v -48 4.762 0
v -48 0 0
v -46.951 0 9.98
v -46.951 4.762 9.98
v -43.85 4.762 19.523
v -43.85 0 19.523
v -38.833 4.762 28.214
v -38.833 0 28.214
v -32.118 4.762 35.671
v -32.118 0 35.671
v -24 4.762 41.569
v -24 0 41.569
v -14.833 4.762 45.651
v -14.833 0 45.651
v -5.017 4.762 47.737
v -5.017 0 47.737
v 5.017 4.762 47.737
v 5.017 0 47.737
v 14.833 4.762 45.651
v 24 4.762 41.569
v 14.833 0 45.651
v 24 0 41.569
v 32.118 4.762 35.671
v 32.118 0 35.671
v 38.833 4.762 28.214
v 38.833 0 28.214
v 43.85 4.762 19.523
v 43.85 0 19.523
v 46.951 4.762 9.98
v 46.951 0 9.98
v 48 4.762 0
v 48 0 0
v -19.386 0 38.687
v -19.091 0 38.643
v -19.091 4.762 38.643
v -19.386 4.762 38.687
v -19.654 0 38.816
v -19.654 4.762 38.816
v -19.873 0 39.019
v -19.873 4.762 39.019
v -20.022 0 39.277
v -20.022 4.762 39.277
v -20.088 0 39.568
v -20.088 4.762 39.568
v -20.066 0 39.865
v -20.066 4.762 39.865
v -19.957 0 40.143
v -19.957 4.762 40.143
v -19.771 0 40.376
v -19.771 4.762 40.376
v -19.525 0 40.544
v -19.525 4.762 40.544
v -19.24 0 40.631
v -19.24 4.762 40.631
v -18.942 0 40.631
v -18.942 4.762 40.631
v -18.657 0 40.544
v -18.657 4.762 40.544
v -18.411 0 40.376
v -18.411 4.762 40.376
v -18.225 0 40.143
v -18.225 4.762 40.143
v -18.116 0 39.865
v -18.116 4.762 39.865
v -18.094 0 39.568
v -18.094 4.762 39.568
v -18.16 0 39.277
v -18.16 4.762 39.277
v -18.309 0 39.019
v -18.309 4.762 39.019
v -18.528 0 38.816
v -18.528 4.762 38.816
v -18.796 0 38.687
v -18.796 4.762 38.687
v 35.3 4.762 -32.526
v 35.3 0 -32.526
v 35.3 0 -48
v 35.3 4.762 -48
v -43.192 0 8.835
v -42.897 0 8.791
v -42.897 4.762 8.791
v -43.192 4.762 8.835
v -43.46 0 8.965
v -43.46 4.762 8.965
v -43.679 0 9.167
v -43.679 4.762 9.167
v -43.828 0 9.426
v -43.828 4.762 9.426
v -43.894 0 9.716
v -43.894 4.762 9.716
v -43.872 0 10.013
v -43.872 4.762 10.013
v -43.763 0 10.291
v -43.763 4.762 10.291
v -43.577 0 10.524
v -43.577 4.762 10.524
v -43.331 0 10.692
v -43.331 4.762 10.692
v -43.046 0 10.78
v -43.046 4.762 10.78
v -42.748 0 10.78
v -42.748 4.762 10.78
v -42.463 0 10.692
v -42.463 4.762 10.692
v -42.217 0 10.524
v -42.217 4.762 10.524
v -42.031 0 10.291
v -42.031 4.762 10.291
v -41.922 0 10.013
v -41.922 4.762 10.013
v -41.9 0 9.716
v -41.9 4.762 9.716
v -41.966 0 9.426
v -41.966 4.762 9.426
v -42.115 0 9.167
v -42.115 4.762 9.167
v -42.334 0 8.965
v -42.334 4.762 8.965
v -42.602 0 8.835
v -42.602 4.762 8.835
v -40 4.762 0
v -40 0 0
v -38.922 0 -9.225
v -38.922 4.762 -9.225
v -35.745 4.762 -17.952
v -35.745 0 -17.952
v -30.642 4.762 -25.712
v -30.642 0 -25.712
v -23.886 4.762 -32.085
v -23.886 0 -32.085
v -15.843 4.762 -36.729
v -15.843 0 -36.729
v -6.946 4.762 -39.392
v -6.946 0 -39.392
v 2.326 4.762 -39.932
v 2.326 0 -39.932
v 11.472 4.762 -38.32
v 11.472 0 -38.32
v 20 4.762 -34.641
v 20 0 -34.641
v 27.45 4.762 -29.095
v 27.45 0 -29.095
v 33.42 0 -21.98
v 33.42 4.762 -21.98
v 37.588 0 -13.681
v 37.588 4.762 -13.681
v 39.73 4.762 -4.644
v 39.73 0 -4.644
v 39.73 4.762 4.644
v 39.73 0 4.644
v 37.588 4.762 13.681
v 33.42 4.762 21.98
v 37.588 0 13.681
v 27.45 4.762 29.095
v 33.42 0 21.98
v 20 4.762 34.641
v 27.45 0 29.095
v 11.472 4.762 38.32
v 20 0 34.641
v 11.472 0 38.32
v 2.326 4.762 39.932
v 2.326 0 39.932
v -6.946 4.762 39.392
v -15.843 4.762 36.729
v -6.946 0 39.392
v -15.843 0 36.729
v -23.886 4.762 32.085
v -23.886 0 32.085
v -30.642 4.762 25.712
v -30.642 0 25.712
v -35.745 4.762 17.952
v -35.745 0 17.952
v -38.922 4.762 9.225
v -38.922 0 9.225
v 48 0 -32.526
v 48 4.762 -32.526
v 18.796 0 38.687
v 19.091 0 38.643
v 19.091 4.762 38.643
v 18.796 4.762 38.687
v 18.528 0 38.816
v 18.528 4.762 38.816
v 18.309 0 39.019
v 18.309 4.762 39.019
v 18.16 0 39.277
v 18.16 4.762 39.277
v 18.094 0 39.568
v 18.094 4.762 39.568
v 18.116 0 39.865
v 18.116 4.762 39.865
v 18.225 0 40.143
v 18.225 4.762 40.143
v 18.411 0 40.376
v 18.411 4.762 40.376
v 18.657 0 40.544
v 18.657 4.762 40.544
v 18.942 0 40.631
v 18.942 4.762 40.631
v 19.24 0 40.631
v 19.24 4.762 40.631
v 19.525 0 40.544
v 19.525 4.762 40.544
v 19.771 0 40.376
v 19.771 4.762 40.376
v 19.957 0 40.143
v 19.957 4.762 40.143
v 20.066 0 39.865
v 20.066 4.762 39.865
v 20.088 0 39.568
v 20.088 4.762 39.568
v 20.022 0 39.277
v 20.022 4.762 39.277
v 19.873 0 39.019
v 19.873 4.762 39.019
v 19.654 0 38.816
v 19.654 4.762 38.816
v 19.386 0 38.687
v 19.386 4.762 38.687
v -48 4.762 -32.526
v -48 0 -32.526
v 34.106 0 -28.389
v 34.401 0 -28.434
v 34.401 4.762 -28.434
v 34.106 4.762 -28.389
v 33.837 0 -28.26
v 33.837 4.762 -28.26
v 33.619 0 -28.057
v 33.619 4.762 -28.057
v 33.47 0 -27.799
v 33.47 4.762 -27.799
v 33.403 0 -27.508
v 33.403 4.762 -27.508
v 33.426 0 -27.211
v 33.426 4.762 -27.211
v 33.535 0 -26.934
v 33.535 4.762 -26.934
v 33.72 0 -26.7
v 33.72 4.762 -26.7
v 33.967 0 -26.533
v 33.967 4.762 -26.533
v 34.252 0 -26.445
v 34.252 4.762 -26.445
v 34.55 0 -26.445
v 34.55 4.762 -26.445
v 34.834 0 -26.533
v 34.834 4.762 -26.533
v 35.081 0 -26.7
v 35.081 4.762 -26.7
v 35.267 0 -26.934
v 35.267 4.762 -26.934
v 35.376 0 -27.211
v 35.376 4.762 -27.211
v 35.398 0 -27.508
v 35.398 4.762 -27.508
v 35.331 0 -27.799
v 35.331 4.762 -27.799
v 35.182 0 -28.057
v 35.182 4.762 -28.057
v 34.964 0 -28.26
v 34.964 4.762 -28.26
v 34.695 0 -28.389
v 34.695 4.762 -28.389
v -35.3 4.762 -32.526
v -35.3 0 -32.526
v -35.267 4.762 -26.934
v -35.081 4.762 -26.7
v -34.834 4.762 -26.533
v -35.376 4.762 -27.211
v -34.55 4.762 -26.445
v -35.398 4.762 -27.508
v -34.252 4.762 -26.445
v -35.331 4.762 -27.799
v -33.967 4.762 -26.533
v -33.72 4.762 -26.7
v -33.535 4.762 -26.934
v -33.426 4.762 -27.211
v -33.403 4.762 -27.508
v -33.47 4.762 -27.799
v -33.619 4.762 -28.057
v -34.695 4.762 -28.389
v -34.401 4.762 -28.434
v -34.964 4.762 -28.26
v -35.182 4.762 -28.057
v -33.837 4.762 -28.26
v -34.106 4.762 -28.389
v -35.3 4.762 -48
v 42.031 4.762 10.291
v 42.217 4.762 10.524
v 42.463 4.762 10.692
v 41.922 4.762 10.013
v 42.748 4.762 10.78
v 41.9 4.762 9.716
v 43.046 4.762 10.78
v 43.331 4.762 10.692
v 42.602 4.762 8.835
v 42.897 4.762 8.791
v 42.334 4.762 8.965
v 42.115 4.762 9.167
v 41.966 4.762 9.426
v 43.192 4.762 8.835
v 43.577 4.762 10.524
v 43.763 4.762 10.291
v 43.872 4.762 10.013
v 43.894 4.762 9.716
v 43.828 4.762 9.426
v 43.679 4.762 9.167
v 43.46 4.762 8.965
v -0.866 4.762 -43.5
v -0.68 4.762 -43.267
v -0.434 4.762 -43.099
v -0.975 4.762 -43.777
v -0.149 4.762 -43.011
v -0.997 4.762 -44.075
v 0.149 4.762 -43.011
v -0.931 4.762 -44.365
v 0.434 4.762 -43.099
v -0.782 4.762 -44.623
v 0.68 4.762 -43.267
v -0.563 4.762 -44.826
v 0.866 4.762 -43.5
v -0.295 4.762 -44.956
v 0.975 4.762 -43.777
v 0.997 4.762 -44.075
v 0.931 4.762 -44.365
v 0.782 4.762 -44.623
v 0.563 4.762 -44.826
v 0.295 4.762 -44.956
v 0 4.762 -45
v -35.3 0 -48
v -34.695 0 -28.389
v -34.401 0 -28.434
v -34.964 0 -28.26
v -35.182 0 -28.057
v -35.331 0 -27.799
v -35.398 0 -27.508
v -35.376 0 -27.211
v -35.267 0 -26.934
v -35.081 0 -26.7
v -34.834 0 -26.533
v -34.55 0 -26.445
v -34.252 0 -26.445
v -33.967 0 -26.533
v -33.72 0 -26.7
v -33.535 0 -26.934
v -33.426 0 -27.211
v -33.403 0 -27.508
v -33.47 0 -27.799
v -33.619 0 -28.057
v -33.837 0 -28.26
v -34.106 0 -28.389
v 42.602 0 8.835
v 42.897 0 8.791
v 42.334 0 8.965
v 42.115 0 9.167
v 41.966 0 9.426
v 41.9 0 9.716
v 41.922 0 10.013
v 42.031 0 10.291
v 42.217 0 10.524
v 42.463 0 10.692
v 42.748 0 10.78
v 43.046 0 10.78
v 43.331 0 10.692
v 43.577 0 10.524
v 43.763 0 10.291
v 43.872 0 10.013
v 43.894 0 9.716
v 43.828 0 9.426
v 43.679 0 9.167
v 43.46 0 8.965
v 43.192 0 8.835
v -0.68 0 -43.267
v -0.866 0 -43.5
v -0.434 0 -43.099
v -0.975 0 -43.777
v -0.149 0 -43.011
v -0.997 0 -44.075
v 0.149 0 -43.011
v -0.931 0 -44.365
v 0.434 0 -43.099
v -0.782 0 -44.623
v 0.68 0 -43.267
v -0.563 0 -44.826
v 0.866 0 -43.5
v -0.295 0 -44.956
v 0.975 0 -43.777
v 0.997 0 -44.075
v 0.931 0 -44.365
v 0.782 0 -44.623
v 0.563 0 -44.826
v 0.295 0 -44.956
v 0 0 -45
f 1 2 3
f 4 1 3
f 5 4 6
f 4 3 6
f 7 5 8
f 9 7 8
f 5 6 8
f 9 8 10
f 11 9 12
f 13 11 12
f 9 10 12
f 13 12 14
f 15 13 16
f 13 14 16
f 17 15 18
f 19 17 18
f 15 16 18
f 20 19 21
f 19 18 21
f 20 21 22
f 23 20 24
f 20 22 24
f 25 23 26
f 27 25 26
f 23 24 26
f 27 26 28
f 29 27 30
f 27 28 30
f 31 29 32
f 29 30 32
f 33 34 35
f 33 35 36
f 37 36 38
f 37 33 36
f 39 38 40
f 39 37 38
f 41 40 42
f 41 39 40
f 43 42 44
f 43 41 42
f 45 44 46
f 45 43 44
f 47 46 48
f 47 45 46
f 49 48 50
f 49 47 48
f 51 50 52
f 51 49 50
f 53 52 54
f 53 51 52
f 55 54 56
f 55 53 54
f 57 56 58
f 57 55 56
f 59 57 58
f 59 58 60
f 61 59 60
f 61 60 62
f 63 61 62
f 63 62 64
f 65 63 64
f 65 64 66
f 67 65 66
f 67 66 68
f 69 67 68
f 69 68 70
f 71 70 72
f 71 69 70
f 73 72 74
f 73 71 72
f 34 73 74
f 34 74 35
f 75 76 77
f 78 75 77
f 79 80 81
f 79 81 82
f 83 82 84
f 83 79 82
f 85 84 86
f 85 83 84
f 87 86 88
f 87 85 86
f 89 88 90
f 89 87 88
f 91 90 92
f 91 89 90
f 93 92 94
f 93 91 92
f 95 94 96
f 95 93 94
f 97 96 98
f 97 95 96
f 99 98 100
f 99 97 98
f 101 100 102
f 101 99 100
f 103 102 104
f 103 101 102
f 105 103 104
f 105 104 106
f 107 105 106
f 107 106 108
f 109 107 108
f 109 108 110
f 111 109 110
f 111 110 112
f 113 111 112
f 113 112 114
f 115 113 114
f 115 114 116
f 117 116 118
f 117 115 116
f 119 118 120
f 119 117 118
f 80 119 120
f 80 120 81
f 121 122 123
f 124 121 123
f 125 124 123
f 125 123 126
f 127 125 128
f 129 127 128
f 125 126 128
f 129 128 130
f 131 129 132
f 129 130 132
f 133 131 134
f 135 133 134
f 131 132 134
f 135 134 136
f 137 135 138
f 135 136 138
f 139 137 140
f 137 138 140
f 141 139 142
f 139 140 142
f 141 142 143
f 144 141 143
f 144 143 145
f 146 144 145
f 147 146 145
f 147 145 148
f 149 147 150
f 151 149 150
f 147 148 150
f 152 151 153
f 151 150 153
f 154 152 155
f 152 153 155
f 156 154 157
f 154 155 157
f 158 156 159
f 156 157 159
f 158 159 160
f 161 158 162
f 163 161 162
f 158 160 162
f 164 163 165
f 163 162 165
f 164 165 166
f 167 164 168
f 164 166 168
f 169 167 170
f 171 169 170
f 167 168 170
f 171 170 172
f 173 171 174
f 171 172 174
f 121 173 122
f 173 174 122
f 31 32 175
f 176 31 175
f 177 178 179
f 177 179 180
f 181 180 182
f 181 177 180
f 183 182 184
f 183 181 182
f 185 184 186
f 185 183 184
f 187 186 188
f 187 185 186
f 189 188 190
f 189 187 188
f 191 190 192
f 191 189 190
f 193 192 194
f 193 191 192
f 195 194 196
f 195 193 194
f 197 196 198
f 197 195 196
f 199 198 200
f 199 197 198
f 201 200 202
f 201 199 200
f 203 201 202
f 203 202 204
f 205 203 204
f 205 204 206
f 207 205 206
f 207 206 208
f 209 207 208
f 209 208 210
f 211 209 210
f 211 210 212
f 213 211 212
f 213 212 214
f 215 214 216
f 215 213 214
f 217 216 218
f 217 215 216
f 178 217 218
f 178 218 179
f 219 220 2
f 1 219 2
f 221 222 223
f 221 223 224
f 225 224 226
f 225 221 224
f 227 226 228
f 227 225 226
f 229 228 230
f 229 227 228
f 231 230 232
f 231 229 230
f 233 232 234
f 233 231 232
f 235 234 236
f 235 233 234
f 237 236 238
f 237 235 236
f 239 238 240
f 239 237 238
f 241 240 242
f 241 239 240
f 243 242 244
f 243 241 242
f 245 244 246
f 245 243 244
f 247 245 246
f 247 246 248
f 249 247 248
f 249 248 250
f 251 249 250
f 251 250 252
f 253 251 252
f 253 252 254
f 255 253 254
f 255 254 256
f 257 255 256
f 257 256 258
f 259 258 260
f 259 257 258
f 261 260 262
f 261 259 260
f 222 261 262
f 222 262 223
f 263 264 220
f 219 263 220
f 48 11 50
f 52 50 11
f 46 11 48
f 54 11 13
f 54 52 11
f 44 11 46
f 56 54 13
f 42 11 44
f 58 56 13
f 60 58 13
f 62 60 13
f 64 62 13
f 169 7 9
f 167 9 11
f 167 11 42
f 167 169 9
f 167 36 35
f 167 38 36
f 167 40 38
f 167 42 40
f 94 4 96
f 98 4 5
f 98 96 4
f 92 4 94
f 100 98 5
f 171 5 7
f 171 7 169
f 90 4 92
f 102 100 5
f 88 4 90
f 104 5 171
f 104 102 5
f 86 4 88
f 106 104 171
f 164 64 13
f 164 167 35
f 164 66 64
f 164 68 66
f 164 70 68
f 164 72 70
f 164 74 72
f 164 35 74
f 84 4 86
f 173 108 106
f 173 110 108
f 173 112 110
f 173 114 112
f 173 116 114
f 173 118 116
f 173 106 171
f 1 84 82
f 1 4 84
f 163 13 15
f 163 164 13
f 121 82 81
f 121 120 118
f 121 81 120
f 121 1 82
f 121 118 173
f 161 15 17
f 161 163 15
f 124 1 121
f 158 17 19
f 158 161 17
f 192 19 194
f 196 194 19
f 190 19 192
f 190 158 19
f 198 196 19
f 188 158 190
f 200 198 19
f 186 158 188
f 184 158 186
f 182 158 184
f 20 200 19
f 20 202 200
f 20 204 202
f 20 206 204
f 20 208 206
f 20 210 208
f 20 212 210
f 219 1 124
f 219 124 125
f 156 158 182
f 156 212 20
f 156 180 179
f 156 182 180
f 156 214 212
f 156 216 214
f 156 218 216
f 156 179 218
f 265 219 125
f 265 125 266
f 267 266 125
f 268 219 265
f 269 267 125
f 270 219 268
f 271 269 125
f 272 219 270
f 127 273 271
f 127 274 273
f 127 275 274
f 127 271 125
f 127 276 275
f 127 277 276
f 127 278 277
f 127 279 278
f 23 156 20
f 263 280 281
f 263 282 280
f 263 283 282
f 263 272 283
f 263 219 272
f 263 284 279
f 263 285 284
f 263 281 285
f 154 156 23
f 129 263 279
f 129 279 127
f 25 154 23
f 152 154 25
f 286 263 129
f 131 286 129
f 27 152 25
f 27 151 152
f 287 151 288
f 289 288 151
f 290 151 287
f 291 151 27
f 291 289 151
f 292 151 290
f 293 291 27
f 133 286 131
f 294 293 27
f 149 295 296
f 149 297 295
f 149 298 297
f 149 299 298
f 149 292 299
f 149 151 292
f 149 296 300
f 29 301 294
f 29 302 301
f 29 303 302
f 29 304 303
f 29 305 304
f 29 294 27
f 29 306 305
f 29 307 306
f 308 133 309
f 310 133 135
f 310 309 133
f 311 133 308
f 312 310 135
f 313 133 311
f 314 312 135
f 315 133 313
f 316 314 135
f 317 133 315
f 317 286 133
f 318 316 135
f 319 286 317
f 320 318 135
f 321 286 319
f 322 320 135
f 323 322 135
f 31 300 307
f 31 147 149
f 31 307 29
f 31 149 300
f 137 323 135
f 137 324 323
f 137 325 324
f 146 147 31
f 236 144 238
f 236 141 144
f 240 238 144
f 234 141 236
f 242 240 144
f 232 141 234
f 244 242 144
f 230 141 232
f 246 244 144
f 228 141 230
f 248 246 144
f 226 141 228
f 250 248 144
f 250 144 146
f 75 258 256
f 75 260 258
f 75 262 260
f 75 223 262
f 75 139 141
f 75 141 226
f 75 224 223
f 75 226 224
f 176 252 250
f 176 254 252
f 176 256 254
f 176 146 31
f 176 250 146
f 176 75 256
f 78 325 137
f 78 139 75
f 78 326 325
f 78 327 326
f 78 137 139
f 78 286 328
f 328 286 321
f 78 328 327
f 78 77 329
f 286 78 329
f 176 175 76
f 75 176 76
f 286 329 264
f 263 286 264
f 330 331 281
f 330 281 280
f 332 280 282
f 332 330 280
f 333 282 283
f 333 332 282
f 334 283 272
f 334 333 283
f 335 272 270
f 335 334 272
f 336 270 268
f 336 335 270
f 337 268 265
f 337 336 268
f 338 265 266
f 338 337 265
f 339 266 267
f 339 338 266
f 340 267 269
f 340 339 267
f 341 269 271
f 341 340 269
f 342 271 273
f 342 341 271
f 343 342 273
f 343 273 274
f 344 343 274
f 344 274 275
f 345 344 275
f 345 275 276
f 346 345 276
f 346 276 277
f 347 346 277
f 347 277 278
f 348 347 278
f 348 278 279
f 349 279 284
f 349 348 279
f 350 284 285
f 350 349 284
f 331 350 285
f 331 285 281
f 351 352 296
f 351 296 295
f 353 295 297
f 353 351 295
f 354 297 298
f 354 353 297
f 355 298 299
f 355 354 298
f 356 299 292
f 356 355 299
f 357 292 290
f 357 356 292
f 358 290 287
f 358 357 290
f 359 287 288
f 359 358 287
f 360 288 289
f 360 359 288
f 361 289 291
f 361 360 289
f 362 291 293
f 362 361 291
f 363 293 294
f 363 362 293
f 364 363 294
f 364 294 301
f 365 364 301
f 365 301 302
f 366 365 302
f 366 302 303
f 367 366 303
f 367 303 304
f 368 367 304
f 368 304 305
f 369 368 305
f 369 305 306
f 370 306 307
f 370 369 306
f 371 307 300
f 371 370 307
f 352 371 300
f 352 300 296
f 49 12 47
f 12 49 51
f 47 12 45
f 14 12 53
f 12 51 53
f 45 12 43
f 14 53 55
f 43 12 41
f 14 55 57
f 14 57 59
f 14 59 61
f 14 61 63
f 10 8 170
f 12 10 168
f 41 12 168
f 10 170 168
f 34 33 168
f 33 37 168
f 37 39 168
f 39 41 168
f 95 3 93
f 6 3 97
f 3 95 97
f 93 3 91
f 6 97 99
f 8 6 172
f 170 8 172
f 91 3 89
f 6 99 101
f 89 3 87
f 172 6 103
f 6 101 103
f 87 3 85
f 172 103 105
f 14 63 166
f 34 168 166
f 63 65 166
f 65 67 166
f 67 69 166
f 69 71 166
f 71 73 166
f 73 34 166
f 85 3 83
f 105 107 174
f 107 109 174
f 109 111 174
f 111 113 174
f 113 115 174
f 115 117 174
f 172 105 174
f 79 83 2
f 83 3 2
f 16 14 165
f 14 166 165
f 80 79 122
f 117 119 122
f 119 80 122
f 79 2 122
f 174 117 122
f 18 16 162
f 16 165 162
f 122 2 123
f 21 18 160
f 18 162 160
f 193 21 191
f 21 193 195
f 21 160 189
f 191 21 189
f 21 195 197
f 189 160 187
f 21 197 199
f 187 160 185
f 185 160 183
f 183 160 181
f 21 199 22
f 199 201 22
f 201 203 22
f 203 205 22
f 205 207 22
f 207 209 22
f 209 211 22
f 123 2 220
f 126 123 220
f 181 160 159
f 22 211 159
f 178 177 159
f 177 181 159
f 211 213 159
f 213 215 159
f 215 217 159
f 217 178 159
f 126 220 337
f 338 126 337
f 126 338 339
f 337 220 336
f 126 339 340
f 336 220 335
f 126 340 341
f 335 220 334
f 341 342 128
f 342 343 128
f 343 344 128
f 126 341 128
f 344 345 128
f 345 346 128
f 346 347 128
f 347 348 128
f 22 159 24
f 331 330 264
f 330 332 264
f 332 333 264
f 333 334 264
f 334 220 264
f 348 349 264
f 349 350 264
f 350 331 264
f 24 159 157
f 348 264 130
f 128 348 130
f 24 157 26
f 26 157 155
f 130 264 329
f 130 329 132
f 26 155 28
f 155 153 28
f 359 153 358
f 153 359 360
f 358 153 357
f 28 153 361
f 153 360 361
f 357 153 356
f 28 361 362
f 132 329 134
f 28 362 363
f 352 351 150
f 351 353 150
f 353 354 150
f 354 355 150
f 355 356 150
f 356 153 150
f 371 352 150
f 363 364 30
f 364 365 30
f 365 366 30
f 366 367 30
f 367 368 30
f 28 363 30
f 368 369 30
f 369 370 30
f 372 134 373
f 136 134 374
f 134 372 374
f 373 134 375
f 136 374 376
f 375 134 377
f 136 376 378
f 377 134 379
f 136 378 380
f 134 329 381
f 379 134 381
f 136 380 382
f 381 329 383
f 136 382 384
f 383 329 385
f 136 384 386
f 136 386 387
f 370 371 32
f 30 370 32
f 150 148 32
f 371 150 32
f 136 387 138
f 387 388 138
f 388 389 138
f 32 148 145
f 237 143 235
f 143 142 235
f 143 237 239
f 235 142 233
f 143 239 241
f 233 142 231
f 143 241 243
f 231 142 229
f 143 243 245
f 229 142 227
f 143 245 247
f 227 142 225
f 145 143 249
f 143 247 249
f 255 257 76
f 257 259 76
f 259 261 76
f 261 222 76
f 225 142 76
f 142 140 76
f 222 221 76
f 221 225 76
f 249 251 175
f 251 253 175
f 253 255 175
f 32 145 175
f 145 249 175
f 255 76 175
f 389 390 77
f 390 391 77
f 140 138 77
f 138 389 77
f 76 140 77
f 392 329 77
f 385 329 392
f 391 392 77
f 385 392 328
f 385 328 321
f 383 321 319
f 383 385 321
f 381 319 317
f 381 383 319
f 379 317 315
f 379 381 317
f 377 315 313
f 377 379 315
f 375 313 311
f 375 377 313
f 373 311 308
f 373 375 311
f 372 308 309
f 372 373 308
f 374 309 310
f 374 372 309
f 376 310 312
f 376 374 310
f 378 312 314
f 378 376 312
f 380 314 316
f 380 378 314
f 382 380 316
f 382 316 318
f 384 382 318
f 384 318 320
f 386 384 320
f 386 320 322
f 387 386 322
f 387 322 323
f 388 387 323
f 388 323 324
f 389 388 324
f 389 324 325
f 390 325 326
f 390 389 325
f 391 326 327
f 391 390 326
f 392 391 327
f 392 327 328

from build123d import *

# Parameters (mm, degrees)
SKETCH1_R           = 40
SKETCH1_R_2         = 1
BOSS_EXTRUDE1_DEPTH = 4.7625


with BuildPart() as part:
    # Sketch1 → Boss-Extrude1 (new body)
    with BuildSketch(Plane(origin=(0, 0, 0), x_dir=(1, 0, 0), z_dir=(0, 1, 0))):
        with BuildLine():
            Line((-35.3, 48), (-35.3, 32.525528435))
            Line((-35.3, 32.525528435), (-48, 32.525528435))
            Line((-48, 32.525528435), (-48, 0))
            ThreePointArc((-48, 0), (0, -48), (48, 0))
            Line((48, 0), (48, 32.525528435))
            Line((48, 32.525528435), (35.3, 32.525528435))
            Line((35.3, 32.525528435), (35.3, 48))
            Line((35.3, 48), (-35.3, 48))
        make_face()
        Circle(SKETCH1_R, mode=Mode.SUBTRACT)
        with Locations((34.400585229, 27.433551282)):
            Circle(SKETCH1_R_2, mode=Mode.SUBTRACT)
        with Locations((-34.400585229, 27.433551282)):
            Circle(SKETCH1_R_2, mode=Mode.SUBTRACT)
        with Locations((0, 44)):
            Circle(SKETCH1_R_2, mode=Mode.SUBTRACT)
        with Locations((19.090884521, -39.642630188)):
            Circle(SKETCH1_R_2, mode=Mode.SUBTRACT)
        with Locations((42.896828136, -9.790921094)):
            Circle(SKETCH1_R_2, mode=Mode.SUBTRACT)
        with Locations((-19.090884521, -39.642630188)):
            Circle(SKETCH1_R_2, mode=Mode.SUBTRACT)
        with Locations((-42.896828136, -9.790921094)):
            Circle(SKETCH1_R_2, mode=Mode.SUBTRACT)
    extrude(amount=BOSS_EXTRUDE1_DEPTH)


solid = part.part
